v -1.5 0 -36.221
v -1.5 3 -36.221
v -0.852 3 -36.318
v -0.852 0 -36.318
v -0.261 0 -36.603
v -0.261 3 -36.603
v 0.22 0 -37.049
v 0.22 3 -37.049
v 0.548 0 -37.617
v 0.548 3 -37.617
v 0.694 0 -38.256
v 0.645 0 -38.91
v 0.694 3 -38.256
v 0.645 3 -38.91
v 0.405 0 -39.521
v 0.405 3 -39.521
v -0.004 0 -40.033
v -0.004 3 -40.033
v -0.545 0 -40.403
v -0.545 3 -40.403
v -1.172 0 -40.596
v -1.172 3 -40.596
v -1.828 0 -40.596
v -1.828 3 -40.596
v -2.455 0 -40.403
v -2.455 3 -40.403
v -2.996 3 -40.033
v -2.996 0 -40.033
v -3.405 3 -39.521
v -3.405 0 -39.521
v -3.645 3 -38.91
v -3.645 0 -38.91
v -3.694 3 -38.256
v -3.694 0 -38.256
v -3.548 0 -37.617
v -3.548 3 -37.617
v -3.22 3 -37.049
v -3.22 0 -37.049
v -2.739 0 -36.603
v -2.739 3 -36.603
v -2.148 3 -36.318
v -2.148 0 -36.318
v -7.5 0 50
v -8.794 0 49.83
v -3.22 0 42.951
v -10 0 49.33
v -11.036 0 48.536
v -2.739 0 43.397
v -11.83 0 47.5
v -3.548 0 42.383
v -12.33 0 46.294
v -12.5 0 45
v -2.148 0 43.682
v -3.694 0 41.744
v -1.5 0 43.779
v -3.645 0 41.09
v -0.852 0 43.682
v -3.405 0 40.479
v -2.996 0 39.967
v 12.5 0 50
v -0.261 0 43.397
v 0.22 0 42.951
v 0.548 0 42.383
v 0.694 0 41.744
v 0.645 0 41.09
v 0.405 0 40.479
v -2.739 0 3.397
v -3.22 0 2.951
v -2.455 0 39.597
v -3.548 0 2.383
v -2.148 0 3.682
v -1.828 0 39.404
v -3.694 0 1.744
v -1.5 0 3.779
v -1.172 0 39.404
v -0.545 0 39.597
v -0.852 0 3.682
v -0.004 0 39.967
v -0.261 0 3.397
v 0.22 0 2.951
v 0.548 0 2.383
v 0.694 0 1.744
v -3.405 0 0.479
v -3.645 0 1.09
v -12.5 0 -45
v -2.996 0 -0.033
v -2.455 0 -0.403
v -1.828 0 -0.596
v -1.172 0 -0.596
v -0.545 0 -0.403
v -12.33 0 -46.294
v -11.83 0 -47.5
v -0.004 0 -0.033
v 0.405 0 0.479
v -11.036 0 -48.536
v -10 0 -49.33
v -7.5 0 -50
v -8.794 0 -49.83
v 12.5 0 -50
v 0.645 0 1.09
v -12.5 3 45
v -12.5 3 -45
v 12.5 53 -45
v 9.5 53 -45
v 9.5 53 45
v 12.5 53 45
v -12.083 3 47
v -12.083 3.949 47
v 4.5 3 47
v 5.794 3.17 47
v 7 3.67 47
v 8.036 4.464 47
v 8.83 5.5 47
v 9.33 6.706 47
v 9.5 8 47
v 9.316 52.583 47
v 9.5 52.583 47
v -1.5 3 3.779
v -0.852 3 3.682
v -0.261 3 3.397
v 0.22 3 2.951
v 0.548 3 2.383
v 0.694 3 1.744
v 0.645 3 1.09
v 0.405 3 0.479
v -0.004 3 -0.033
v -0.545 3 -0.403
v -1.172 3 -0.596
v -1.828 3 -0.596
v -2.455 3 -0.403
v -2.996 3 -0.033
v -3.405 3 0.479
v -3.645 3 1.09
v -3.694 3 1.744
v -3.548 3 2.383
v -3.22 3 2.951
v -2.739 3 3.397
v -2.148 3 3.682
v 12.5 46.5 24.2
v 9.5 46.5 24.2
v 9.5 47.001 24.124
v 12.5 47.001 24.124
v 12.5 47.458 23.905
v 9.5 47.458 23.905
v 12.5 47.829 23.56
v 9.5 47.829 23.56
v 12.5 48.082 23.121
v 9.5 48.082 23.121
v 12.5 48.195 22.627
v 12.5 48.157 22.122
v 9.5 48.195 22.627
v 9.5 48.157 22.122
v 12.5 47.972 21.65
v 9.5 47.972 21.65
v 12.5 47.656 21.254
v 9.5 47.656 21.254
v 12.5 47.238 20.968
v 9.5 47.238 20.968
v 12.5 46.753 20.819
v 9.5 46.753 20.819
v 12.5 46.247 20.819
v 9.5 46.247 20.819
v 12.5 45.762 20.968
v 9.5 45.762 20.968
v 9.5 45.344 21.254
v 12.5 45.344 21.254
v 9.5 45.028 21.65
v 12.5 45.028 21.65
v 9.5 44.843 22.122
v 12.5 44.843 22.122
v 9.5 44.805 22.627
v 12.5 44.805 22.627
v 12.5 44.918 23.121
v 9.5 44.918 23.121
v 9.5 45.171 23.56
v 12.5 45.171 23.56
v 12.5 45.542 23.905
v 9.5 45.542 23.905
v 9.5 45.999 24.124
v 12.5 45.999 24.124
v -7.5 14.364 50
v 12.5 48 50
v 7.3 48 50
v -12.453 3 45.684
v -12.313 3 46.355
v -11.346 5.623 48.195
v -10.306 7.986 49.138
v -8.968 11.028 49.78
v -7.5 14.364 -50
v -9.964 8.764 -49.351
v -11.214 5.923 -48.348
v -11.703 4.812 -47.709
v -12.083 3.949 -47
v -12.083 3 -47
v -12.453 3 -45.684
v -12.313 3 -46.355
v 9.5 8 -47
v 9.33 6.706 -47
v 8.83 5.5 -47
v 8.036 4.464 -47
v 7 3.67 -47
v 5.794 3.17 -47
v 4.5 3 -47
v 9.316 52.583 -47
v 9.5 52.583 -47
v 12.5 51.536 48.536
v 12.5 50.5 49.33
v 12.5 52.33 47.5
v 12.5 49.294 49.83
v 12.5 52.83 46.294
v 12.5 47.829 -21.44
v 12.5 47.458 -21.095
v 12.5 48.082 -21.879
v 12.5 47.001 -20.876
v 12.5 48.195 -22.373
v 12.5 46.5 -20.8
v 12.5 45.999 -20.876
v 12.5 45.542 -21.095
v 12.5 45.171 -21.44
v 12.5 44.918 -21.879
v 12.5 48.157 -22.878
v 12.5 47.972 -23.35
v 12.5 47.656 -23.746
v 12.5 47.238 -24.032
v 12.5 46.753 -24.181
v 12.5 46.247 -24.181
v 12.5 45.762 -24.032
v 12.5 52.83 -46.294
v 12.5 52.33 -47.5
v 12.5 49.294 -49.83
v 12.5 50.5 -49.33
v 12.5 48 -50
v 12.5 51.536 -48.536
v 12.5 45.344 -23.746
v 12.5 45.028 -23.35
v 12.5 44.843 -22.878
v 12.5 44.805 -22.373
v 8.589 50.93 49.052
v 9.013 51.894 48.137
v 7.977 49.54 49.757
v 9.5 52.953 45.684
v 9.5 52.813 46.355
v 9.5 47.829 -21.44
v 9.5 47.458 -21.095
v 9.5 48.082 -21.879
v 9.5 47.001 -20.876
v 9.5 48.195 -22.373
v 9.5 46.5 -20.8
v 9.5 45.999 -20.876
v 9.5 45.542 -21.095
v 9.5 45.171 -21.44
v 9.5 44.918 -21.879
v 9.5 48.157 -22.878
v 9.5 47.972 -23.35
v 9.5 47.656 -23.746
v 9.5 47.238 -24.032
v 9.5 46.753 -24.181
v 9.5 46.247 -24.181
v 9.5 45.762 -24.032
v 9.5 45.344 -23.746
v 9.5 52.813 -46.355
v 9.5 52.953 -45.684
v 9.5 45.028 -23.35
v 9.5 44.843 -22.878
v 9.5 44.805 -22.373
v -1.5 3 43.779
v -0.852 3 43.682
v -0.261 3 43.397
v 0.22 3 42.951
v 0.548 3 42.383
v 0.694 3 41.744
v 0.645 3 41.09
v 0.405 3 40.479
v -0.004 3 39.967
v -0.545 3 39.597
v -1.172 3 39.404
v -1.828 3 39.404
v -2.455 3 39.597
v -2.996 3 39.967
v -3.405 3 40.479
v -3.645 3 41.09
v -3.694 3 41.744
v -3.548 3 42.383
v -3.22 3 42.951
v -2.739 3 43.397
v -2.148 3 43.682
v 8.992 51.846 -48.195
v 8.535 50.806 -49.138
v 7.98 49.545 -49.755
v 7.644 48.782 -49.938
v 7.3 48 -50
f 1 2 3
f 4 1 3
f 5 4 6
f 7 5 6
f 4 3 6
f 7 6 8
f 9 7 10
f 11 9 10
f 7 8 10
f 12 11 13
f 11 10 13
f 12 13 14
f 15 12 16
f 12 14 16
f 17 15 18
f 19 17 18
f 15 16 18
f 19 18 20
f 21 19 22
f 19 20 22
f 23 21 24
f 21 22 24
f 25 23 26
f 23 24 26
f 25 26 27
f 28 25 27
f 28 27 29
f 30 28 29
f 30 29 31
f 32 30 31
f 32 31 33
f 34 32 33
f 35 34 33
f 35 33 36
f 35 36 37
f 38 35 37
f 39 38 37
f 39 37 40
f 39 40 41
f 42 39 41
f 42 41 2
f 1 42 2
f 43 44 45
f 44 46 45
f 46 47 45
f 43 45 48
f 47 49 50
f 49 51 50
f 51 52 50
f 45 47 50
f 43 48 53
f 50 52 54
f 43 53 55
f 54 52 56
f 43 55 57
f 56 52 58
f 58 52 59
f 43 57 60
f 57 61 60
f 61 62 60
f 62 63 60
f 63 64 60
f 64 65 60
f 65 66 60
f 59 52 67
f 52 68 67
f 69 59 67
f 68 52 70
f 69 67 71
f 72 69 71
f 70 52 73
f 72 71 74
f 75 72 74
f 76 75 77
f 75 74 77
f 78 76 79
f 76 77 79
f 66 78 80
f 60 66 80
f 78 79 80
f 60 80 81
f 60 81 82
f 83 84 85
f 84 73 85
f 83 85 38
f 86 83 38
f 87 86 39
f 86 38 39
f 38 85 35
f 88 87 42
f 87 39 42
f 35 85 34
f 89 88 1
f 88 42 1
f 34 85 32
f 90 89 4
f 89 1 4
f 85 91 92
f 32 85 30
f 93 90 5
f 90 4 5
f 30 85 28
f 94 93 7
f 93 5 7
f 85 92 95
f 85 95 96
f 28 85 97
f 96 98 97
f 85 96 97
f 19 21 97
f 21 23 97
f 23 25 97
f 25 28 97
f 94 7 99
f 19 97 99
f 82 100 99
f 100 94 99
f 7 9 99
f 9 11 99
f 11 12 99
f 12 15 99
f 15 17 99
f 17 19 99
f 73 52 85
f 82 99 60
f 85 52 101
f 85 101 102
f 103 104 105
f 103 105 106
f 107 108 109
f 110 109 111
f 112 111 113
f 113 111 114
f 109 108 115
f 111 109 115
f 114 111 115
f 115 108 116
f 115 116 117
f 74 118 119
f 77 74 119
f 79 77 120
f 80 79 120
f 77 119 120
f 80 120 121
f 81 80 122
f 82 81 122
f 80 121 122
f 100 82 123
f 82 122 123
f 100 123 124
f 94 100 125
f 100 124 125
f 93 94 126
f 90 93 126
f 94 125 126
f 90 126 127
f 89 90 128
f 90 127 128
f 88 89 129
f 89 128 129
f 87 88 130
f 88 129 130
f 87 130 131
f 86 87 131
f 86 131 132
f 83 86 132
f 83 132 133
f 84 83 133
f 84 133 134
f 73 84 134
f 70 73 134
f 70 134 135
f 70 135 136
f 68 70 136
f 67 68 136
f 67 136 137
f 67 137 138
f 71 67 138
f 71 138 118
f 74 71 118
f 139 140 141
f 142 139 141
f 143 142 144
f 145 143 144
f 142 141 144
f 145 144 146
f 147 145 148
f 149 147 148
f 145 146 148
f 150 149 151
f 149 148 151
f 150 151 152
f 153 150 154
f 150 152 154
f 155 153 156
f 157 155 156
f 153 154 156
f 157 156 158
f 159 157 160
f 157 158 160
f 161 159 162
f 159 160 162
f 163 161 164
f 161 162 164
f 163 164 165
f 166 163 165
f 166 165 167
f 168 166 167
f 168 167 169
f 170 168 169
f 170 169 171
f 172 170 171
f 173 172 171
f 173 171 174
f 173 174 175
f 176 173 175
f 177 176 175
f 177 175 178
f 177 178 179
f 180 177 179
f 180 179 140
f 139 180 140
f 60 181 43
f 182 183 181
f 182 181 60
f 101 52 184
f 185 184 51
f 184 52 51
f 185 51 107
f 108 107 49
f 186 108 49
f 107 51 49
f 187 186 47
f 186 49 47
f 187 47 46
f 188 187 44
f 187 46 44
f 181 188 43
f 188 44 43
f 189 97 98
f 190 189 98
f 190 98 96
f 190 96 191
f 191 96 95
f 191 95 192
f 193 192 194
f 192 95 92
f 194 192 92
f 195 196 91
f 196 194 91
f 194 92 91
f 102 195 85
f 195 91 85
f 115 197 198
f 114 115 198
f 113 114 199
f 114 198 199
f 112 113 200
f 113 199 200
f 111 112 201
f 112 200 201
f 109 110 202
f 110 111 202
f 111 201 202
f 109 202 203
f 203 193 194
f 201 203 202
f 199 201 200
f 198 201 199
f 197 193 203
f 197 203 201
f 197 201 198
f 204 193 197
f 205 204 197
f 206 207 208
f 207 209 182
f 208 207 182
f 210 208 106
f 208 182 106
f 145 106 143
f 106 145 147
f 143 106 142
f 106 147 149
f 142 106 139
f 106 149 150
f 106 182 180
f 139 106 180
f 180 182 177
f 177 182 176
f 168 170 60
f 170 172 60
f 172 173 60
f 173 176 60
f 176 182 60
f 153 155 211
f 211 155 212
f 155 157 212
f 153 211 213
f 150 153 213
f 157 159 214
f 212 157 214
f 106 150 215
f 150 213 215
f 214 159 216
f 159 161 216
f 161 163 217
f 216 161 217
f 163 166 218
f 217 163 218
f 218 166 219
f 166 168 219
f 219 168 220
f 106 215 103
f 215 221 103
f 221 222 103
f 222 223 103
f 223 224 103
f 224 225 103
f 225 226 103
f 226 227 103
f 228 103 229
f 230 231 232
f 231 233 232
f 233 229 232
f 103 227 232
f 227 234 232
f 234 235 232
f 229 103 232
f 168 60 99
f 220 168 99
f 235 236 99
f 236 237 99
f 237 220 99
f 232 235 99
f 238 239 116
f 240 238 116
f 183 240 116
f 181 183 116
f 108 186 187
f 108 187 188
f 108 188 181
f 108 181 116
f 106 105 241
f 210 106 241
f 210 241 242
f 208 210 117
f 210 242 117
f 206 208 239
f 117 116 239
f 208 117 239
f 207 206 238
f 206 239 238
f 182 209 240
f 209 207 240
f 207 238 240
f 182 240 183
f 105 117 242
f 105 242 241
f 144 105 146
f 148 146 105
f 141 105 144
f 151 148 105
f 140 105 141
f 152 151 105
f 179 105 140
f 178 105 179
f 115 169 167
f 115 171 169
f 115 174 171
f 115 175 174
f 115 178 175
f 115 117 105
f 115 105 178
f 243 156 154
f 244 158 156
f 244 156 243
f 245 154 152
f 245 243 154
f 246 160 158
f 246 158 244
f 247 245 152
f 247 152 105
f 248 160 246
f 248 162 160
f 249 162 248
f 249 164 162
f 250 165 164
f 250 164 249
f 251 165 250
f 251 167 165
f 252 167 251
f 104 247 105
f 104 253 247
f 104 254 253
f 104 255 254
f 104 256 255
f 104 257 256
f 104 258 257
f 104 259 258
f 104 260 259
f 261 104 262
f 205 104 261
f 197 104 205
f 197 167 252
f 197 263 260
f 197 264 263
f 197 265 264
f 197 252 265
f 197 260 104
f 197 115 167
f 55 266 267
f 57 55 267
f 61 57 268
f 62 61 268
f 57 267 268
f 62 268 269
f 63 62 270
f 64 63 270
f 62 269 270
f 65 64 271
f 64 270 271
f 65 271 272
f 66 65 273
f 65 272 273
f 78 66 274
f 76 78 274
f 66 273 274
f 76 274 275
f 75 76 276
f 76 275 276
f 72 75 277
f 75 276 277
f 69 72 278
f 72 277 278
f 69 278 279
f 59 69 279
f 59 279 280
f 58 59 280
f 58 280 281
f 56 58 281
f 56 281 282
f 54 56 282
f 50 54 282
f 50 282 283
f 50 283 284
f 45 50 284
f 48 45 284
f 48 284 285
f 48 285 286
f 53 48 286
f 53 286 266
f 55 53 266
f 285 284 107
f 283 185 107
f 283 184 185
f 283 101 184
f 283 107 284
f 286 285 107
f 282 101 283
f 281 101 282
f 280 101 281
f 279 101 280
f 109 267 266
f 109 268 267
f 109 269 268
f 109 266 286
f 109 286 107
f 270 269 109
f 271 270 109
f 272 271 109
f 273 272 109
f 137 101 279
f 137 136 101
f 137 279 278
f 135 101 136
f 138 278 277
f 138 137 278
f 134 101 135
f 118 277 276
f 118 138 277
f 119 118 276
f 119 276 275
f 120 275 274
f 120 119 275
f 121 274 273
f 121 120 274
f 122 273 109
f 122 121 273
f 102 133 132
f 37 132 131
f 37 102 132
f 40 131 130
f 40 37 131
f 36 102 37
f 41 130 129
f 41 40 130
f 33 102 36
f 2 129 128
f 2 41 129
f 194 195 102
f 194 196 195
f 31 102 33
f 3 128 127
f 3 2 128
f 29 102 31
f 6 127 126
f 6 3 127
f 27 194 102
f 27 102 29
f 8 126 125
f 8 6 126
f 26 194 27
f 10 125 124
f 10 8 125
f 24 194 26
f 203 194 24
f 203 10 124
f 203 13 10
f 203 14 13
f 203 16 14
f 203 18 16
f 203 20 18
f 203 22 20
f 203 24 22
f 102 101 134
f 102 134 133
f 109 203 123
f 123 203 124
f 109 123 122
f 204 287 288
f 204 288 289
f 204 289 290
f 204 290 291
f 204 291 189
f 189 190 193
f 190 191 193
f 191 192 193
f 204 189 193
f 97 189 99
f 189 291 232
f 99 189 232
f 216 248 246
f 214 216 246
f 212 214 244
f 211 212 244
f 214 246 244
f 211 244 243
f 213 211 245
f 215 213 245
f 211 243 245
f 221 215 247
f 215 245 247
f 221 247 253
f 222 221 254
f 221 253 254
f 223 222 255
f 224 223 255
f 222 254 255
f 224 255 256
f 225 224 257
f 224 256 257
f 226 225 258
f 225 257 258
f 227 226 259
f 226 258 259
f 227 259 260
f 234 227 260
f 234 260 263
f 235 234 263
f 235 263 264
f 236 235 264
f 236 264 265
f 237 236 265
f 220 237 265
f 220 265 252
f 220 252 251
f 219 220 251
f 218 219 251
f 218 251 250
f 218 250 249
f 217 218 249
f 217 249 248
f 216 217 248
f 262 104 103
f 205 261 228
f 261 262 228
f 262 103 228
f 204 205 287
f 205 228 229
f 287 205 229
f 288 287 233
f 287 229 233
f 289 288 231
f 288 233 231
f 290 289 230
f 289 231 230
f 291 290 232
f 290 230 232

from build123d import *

# Parameters (mm, degrees)
SKETCH1_W           = 25
SKETCH1_H           = 100
BOSS_EXTRUDE1_DEPTH = 3
SKETCH2_W           = 3
SKETCH2_H           = 100
BOSS_EXTRUDE2_DEPTH = 50
SKETCH3_R           = 1.7
CUT_EXTRUDE1_DEPTH  = 25
SKETCH4_R           = 2.2
CUT_EXTRUDE2_DEPTH  = 25
FILLET1_R           = 5
BOSS_EXTRUDE3_DEPTH = 3
FILLET2_R           = 5


with BuildPart() as part:
    # Sketch1 → Boss-Extrude1 (new body)
    with BuildSketch(Plane(origin=(0, 0, 0), x_dir=(1, 0, 0), z_dir=(0, 1, 0))):
        Rectangle(SKETCH1_W, SKETCH1_H)
    extrude(amount=BOSS_EXTRUDE1_DEPTH)

    # Sketch2 → Boss-Extrude2 (add)
    with BuildSketch(Plane(origin=(0, 3, 0), x_dir=(1, 0, 0), z_dir=(0, 1, 0))):
        with Locations((11, 0)):
            Rectangle(SKETCH2_W, SKETCH2_H)
    extrude(amount=BOSS_EXTRUDE2_DEPTH)

    # Sketch3 → Cut-Extrude1 (cut)
    with BuildSketch(Plane.ZY.offset(-9.5)):
        with Locations((-22.5, 46.5)):
            Circle(SKETCH3_R)
        with Locations((22.5, 46.5)):
            Circle(SKETCH3_R)
    extrude(amount=-CUT_EXTRUDE1_DEPTH, mode=Mode.SUBTRACT)

    # Sketch4 → Cut-Extrude2 (cut)
    with BuildSketch(Plane(origin=(0, 3, 0), x_dir=(1, 0, 0), z_dir=(0, 1, 0))):
        with Locations(Location((-1.5, -1.579280152, 0), (0, 0, 270))):
            Circle(SKETCH4_R)
        with Locations(Location((-1.5, 38.420719848, 0), (0, 0, 270))):
            Circle(SKETCH4_R)
        with Locations(Location((-1.5, -41.579280152, 0), (0, 0, 270))):
            Circle(SKETCH4_R)
    extrude(amount=-CUT_EXTRUDE2_DEPTH, mode=Mode.SUBTRACT)

    # Fillet1
    fillet1_edges = [part.edges().sort_by_distance(p)[0] for p in [
        (9.5, 3, 0),
    ]]
    fillet(fillet1_edges, radius=FILLET1_R)

    # Sketch5 → Boss-Extrude3 (add)
    with BuildSketch(Plane.XY.offset(50)):
        with BuildLine():
            Line((9.5, 53), (-12.5, 3))
            Line((-12.5, 3), (4.5, 3))
            ThreePointArc((4.5, 3), (8.035533906, 4.464466094), (9.5, 8))
            Line((9.5, 8), (9.5, 53))
        make_face()
    boss_extrude3 = extrude(amount=-BOSS_EXTRUDE3_DEPTH)

    # Mirror1: Boss-Extrude3 across plane
    add(boss_extrude3.mirror(Plane.XY))

    # Fillet2
    # the kernel refuses this fillet: 5 mm, written as the material it takes off along each edge
    with BuildSketch(Plane(origin=(25, 53, -50), x_dir=(0, 0, 1), z_dir=(-1, 0, 0))) as fillet2_piece_1:
        with BuildLine():
            CenterArc((FILLET2_R, -FILLET2_R), FILLET2_R, 90, 90)
            Line((0, -FILLET2_R), (0, 0))
            Line((0, 0), (FILLET2_R, 0))
        make_face()
    extrude(amount=28, mode=Mode.SUBTRACT)
    with BuildSketch(Plane(origin=(-3, 53, 50), x_dir=(0, -1, 0), z_dir=(1, 0, 0)), Plane(origin=(-12.5, -12.5, -50), x_dir=(0, 0, 1), z_dir=(0, 1, 0)), Plane(origin=(-12.5, -12.5, 50), x_dir=(1, 0, 0), z_dir=(0, 1, 0))) as fillet2_piece_2:
        with BuildLine():
            CenterArc((FILLET2_R, FILLET2_R), FILLET2_R, 180, 90)
            Line((0, FILLET2_R), (0, 0))
            Line((0, 0), (FILLET2_R, 0))
        make_face()
    extrude(amount=28, mode=Mode.SUBTRACT)


solid = part.part
